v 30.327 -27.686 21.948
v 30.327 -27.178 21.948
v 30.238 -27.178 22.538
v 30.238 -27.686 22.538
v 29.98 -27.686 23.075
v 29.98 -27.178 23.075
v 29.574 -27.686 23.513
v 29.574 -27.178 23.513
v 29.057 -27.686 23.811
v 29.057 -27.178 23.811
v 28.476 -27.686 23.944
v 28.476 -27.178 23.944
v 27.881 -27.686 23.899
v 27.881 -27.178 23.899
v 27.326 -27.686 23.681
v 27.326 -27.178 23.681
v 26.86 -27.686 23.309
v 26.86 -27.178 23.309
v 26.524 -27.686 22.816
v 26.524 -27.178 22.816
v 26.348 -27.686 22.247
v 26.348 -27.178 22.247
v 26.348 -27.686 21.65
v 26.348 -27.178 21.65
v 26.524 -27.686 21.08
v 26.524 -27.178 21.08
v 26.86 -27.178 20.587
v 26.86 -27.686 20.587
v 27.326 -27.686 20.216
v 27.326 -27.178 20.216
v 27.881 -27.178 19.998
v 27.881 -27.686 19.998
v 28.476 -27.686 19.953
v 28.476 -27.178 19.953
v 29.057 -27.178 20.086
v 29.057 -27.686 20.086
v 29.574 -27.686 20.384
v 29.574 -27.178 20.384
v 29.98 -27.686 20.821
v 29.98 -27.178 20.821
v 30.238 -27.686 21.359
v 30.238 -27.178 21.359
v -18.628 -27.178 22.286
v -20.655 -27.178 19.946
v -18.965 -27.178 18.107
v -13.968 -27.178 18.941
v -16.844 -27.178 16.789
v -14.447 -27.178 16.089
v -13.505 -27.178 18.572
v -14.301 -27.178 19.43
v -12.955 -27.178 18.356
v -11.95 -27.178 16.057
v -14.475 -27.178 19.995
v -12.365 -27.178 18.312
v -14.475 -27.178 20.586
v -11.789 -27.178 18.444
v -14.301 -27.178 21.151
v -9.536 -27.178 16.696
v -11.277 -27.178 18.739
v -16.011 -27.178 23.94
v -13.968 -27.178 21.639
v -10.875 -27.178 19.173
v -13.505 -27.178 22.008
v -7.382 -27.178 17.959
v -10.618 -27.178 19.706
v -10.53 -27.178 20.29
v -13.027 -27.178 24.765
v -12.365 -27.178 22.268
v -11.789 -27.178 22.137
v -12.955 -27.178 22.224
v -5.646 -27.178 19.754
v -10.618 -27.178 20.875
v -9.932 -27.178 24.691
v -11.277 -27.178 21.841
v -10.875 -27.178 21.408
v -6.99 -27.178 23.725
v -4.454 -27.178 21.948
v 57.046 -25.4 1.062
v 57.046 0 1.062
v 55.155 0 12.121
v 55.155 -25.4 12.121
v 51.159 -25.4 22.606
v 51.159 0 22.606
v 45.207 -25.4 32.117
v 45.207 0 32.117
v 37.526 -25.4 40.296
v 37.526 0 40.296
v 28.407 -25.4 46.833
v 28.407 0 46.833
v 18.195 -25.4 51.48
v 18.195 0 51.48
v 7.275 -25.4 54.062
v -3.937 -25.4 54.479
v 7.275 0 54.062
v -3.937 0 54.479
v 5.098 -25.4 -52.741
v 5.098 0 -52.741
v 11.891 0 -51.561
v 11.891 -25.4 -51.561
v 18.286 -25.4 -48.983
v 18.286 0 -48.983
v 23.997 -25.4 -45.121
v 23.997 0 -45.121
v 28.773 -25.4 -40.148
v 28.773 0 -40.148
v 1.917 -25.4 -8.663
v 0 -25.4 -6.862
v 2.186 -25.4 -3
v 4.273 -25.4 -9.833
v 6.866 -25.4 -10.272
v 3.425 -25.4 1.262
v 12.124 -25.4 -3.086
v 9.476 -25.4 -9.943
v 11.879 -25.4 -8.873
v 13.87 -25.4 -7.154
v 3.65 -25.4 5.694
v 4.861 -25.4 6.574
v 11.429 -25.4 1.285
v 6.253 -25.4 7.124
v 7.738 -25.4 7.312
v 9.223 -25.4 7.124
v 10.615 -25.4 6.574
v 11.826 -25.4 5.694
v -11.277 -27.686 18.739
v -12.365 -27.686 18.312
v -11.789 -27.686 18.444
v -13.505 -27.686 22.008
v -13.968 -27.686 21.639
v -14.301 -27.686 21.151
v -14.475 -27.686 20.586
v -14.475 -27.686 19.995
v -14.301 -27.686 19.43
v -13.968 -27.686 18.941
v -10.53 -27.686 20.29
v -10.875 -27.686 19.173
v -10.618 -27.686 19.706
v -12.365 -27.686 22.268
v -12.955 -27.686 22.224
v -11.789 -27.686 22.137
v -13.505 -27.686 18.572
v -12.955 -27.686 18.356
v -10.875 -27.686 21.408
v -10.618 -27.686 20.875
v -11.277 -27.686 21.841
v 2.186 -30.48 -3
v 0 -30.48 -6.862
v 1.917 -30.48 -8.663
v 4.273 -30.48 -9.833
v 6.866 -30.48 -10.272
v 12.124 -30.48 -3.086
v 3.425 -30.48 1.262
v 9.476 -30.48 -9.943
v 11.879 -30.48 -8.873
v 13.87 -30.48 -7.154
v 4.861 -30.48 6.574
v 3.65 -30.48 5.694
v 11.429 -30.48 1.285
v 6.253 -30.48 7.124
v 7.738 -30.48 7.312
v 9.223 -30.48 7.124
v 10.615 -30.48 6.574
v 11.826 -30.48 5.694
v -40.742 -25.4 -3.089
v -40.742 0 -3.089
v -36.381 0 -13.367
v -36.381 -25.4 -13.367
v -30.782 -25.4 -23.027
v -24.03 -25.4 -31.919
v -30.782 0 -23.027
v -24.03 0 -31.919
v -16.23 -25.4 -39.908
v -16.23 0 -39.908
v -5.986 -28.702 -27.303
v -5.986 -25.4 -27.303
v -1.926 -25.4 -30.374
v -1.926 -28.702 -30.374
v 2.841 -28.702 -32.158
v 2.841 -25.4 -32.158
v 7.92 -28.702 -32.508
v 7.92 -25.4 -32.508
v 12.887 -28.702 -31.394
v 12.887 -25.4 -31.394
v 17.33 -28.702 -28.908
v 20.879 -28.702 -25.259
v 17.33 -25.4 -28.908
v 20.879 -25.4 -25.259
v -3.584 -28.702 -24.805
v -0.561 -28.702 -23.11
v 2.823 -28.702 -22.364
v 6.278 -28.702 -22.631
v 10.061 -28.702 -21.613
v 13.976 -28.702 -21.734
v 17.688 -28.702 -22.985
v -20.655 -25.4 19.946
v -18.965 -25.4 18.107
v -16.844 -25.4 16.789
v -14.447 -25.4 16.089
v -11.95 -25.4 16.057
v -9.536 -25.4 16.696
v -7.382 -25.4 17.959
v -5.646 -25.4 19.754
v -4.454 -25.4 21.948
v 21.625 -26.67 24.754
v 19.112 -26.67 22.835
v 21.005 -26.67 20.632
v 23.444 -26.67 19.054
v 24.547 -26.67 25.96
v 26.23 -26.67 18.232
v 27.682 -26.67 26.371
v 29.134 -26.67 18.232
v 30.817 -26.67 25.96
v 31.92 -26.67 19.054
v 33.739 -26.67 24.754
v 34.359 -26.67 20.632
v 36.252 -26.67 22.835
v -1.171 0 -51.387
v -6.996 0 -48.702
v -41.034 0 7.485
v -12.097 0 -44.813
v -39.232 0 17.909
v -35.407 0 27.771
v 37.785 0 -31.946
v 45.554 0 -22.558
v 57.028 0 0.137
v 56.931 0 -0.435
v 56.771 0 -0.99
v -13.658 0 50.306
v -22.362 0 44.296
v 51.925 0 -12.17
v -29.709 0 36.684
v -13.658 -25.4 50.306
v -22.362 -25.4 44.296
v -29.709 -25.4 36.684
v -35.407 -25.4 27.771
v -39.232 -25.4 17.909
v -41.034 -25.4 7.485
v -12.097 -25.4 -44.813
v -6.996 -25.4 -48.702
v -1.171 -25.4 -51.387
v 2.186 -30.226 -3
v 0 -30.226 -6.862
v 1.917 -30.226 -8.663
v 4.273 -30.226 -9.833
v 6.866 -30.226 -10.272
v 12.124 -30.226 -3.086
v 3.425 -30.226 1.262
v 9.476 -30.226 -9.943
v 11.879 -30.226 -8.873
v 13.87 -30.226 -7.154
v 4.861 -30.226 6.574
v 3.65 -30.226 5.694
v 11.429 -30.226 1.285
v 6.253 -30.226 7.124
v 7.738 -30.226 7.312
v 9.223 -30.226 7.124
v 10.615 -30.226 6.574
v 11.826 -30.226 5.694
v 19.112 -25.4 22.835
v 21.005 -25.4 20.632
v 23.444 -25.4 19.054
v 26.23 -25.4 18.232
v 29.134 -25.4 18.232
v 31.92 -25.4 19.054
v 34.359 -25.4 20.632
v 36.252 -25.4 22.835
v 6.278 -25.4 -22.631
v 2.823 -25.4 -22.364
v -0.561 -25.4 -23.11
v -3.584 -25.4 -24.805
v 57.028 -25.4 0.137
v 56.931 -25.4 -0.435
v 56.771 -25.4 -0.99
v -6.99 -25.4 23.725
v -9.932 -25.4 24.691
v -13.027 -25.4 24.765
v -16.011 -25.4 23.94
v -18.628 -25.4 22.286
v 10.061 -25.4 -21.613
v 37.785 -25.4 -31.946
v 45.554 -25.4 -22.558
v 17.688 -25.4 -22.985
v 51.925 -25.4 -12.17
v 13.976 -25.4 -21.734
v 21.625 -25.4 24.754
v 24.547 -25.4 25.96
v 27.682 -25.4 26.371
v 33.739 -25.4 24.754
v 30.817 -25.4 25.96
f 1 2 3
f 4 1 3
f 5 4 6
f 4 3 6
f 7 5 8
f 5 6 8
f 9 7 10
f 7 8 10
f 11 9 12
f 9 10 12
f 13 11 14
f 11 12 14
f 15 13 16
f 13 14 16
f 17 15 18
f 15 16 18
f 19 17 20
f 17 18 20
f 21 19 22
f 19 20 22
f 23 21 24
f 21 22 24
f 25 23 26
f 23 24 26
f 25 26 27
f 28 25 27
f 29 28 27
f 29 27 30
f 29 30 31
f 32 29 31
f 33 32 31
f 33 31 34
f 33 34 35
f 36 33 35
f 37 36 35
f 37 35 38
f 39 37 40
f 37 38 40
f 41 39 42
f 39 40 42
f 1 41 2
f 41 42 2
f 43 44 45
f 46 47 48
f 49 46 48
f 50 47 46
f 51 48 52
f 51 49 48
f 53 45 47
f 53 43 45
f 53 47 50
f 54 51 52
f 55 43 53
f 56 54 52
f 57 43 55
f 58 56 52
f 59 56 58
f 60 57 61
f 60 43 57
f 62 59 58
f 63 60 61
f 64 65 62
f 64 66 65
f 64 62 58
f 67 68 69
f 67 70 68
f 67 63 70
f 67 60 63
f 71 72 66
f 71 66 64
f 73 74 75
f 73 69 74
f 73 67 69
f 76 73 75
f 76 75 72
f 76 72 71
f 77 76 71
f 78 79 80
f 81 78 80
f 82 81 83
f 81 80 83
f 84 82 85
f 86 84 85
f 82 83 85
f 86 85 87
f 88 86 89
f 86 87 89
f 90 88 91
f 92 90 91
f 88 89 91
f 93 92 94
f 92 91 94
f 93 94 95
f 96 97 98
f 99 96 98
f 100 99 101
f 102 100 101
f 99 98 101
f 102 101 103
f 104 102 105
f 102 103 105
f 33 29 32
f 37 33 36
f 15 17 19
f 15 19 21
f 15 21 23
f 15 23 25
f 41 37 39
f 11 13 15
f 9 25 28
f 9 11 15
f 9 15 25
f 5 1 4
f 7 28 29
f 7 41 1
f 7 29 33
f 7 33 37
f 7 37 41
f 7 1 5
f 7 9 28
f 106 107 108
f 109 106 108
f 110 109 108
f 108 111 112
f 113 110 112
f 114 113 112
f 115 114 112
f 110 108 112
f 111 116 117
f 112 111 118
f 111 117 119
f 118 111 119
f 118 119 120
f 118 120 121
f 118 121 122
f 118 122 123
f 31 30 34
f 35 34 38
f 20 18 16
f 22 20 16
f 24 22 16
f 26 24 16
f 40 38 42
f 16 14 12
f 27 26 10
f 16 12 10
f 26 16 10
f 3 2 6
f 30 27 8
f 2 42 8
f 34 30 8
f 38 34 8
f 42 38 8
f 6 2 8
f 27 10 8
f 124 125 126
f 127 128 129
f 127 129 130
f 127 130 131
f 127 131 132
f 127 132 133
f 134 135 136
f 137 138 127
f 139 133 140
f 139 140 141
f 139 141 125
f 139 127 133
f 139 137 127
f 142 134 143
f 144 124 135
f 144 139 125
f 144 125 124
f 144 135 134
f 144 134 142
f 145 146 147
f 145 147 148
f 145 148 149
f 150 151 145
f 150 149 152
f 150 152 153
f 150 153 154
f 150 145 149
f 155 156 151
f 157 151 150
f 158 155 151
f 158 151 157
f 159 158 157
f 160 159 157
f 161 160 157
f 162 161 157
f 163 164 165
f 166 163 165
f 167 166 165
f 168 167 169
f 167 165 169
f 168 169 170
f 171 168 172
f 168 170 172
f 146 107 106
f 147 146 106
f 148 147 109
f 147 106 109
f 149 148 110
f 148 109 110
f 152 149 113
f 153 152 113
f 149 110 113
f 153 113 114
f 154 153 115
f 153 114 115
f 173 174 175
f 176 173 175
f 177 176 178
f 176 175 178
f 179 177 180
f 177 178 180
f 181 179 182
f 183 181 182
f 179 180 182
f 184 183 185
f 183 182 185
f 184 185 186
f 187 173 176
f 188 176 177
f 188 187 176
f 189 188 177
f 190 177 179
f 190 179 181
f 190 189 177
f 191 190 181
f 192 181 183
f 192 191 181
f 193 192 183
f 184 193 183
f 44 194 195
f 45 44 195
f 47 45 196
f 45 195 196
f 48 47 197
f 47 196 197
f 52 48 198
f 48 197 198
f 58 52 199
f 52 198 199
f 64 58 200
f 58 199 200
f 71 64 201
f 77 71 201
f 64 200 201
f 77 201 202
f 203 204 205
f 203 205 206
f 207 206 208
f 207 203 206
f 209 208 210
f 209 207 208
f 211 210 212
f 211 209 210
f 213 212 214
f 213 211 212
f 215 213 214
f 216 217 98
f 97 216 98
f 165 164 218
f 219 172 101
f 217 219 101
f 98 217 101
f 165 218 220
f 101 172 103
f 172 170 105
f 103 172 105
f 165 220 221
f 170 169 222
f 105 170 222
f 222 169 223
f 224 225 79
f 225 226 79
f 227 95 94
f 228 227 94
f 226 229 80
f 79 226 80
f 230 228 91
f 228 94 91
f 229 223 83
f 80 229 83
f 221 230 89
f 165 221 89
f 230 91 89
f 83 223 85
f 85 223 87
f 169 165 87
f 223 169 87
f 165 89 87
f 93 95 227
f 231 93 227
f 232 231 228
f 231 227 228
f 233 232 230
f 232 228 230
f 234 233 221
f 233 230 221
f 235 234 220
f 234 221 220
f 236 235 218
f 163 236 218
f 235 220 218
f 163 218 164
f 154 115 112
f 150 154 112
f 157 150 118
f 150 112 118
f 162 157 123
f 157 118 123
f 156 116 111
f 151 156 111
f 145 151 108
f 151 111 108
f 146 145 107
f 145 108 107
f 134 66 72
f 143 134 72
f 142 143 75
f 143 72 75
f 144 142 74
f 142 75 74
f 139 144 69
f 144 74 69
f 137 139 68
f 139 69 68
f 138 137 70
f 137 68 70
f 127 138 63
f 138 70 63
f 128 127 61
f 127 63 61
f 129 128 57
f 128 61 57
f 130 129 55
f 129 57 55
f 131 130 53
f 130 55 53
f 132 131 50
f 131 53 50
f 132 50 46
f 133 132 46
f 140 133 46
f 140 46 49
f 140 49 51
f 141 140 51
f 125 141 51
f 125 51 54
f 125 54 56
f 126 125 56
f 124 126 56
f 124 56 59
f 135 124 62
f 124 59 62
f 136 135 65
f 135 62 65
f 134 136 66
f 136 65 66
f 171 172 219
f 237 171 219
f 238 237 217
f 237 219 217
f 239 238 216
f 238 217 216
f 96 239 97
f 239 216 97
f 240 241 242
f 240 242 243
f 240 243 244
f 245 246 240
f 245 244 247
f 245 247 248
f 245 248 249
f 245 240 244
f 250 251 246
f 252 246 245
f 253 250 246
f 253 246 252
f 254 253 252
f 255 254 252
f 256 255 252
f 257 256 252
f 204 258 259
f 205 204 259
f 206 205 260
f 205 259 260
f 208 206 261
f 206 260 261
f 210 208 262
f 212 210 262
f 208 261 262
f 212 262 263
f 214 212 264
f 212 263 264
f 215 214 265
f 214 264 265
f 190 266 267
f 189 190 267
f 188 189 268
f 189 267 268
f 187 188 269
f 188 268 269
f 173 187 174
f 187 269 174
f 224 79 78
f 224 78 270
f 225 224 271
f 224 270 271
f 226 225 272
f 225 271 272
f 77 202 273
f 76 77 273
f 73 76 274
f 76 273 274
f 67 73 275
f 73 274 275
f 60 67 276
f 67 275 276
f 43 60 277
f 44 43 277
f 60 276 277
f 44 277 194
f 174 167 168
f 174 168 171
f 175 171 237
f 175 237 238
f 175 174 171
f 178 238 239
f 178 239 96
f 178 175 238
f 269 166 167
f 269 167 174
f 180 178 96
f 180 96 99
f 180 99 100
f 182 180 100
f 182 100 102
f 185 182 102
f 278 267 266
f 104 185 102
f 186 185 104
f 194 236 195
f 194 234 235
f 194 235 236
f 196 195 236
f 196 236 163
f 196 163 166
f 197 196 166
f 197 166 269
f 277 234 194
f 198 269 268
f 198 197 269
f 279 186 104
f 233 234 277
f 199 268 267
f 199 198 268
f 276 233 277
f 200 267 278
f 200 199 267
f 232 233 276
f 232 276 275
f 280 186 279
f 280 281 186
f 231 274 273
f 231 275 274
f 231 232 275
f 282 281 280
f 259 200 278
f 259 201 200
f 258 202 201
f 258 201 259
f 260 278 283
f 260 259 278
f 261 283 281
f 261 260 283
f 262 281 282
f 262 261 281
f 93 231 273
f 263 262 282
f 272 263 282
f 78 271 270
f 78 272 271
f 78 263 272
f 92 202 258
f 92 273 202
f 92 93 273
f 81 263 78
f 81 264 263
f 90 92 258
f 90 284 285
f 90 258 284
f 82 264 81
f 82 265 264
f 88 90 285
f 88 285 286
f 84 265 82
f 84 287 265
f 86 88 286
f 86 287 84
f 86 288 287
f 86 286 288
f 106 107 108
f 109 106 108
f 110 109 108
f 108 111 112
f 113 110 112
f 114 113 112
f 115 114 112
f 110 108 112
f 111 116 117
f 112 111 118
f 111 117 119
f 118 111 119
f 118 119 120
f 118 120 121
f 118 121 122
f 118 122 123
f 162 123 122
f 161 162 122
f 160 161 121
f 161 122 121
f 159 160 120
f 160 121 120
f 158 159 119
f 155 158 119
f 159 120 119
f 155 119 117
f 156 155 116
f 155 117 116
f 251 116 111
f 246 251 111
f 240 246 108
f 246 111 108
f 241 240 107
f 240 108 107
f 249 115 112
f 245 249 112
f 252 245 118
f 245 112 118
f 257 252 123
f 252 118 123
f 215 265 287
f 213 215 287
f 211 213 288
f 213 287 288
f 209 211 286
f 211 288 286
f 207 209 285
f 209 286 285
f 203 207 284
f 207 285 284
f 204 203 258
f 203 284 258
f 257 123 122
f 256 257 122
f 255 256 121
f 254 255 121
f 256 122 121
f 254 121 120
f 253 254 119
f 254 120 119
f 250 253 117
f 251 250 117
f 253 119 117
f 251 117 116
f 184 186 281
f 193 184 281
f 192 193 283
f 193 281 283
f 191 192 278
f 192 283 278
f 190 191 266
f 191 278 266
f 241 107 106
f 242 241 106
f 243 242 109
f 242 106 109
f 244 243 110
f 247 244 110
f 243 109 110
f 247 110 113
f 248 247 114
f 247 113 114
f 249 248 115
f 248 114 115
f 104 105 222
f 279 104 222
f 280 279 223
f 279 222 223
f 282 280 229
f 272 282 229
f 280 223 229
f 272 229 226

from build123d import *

# Parameters (mm, degrees)
F1_DEPTH  = 25.4
F2_R      = 5.08
F7_DEPTH  = 1.778
F8_DEPTH  = 1.27
F9_R      = 1.983549
F9_R_2    = 2.000866
F10_DEPTH = 0.508
F13_DEPTH = 3.302
F15_DEPTH = 4.826
F16_DEPTH = 5.08


with BuildPart() as f1:
    # F0 (on Front) → F1 (new body)
    with BuildSketch(Plane.XZ):
        with BuildLine():
            ThreePointArc((57.112481, 0), (37.924896, 39.944128), (-3.937069, 54.479349))
            ThreePointArc((-3.937069, 54.479349), (-32.779272, 32.369491), (-40.742062, -3.089111))
            ThreePointArc((-40.742062, -3.089111), (-30.781692, -23.026947), (-16.22959, -39.907783))
            ThreePointArc((-16.22959, -39.907783), (-6.995957, -48.701661), (5.098473, -52.741095))
            ThreePointArc((5.098473, -52.741095), (18.285511, -48.982574), (28.772663, -40.148318))
            ThreePointArc((28.772663, -40.148318), (45.857052, -22.131426), (57.112481, 0))
        make_face()
    extrude(amount=F1_DEPTH)

    # F2
    f2_edges = [f1.edges().sort_by_distance(p)[0] for p in [
        (57.112481, -12.7, 0),
    ]]
    fillet(f2_edges, radius=F2_R)

    # F5 (on face) → F7 (join)
    with BuildSketch(Plane.XZ.offset(25.4)):
        with BuildLine():
            ThreePointArc((-20.655226, 19.945692), (-11.950308, 16.056566), (-4.454444, 21.948334))
            ThreePointArc((-4.454444, 21.948334), (-13.026794, 24.765018), (-20.655226, 19.945692))
        make_face()
    extrude(amount=F7_DEPTH)

    # F6 (on face) → F8 (join)
    with BuildSketch(Plane.XZ.offset(25.4)):
        with BuildLine():
            ThreePointArc((19.112366, 22.835286), (27.682105, 18.127229), (36.251843, 22.835286))
            ThreePointArc((36.251843, 22.835286), (27.682105, 26.371202), (19.112366, 22.835286))
        make_face()
    extrude(amount=F8_DEPTH)

    # F9 (on face) → F10 (join)
    with BuildSketch(Plane.XZ.offset(27.178)):
        with Locations((-12.513474, 20.290239)):
            Circle(F9_R)
        with Locations((28.326349, 21.948334)):
            Circle(F9_R_2)
    extrude(amount=F10_DEPTH)

    # F12 (on face) → F13 (join)
    with BuildSketch(Plane.XZ.offset(25.4)):
        with BuildLine():
            ThreePointArc((20.878522, -25.258632), (13.976197, -21.73428), (6.278158, -22.630567))
            ThreePointArc((6.278158, -22.630567), (-0.561298, -23.109957), (-5.986149, -27.302684))
            ThreePointArc((-5.986149, -27.302684), (7.920002, -32.507944), (20.878522, -25.258632))
        make_face()
    extrude(amount=F13_DEPTH)


with BuildPart() as f15:
    # F14 (on face) → F15 (new body)
    with BuildSketch(Plane.XZ.offset(25.4)):
        with BuildLine():
            ThreePointArc((3.650092, 5.694143), (2.929769, -0.905155), (0, -6.862171))
            ThreePointArc((0, -6.862171), (6.866457, -10.272166), (13.870345, -7.154179))
            ThreePointArc((13.870345, -7.154179), (11.640881, -0.922111), (11.826294, 5.694143))
            ThreePointArc((11.826294, 5.694143), (7.738193, 7.311782), (3.650092, 5.694143))
        make_face()
    extrude(amount=F15_DEPTH)


with BuildPart() as f16:
    # F14 (on face) → F16 (new body)
    with BuildSketch(Plane.XZ.offset(25.4)):
        with BuildLine():
            ThreePointArc((3.650092, 5.694143), (2.929769, -0.905155), (0, -6.862171))
            ThreePointArc((0, -6.862171), (6.866457, -10.272166), (13.870345, -7.154179))
            ThreePointArc((13.870345, -7.154179), (11.640881, -0.922111), (11.826294, 5.694143))
            ThreePointArc((11.826294, 5.694143), (7.738193, 7.311782), (3.650092, 5.694143))
        make_face()
    extrude(amount=F16_DEPTH)


solid = Compound([f1.part, f15.part, f16.part])
